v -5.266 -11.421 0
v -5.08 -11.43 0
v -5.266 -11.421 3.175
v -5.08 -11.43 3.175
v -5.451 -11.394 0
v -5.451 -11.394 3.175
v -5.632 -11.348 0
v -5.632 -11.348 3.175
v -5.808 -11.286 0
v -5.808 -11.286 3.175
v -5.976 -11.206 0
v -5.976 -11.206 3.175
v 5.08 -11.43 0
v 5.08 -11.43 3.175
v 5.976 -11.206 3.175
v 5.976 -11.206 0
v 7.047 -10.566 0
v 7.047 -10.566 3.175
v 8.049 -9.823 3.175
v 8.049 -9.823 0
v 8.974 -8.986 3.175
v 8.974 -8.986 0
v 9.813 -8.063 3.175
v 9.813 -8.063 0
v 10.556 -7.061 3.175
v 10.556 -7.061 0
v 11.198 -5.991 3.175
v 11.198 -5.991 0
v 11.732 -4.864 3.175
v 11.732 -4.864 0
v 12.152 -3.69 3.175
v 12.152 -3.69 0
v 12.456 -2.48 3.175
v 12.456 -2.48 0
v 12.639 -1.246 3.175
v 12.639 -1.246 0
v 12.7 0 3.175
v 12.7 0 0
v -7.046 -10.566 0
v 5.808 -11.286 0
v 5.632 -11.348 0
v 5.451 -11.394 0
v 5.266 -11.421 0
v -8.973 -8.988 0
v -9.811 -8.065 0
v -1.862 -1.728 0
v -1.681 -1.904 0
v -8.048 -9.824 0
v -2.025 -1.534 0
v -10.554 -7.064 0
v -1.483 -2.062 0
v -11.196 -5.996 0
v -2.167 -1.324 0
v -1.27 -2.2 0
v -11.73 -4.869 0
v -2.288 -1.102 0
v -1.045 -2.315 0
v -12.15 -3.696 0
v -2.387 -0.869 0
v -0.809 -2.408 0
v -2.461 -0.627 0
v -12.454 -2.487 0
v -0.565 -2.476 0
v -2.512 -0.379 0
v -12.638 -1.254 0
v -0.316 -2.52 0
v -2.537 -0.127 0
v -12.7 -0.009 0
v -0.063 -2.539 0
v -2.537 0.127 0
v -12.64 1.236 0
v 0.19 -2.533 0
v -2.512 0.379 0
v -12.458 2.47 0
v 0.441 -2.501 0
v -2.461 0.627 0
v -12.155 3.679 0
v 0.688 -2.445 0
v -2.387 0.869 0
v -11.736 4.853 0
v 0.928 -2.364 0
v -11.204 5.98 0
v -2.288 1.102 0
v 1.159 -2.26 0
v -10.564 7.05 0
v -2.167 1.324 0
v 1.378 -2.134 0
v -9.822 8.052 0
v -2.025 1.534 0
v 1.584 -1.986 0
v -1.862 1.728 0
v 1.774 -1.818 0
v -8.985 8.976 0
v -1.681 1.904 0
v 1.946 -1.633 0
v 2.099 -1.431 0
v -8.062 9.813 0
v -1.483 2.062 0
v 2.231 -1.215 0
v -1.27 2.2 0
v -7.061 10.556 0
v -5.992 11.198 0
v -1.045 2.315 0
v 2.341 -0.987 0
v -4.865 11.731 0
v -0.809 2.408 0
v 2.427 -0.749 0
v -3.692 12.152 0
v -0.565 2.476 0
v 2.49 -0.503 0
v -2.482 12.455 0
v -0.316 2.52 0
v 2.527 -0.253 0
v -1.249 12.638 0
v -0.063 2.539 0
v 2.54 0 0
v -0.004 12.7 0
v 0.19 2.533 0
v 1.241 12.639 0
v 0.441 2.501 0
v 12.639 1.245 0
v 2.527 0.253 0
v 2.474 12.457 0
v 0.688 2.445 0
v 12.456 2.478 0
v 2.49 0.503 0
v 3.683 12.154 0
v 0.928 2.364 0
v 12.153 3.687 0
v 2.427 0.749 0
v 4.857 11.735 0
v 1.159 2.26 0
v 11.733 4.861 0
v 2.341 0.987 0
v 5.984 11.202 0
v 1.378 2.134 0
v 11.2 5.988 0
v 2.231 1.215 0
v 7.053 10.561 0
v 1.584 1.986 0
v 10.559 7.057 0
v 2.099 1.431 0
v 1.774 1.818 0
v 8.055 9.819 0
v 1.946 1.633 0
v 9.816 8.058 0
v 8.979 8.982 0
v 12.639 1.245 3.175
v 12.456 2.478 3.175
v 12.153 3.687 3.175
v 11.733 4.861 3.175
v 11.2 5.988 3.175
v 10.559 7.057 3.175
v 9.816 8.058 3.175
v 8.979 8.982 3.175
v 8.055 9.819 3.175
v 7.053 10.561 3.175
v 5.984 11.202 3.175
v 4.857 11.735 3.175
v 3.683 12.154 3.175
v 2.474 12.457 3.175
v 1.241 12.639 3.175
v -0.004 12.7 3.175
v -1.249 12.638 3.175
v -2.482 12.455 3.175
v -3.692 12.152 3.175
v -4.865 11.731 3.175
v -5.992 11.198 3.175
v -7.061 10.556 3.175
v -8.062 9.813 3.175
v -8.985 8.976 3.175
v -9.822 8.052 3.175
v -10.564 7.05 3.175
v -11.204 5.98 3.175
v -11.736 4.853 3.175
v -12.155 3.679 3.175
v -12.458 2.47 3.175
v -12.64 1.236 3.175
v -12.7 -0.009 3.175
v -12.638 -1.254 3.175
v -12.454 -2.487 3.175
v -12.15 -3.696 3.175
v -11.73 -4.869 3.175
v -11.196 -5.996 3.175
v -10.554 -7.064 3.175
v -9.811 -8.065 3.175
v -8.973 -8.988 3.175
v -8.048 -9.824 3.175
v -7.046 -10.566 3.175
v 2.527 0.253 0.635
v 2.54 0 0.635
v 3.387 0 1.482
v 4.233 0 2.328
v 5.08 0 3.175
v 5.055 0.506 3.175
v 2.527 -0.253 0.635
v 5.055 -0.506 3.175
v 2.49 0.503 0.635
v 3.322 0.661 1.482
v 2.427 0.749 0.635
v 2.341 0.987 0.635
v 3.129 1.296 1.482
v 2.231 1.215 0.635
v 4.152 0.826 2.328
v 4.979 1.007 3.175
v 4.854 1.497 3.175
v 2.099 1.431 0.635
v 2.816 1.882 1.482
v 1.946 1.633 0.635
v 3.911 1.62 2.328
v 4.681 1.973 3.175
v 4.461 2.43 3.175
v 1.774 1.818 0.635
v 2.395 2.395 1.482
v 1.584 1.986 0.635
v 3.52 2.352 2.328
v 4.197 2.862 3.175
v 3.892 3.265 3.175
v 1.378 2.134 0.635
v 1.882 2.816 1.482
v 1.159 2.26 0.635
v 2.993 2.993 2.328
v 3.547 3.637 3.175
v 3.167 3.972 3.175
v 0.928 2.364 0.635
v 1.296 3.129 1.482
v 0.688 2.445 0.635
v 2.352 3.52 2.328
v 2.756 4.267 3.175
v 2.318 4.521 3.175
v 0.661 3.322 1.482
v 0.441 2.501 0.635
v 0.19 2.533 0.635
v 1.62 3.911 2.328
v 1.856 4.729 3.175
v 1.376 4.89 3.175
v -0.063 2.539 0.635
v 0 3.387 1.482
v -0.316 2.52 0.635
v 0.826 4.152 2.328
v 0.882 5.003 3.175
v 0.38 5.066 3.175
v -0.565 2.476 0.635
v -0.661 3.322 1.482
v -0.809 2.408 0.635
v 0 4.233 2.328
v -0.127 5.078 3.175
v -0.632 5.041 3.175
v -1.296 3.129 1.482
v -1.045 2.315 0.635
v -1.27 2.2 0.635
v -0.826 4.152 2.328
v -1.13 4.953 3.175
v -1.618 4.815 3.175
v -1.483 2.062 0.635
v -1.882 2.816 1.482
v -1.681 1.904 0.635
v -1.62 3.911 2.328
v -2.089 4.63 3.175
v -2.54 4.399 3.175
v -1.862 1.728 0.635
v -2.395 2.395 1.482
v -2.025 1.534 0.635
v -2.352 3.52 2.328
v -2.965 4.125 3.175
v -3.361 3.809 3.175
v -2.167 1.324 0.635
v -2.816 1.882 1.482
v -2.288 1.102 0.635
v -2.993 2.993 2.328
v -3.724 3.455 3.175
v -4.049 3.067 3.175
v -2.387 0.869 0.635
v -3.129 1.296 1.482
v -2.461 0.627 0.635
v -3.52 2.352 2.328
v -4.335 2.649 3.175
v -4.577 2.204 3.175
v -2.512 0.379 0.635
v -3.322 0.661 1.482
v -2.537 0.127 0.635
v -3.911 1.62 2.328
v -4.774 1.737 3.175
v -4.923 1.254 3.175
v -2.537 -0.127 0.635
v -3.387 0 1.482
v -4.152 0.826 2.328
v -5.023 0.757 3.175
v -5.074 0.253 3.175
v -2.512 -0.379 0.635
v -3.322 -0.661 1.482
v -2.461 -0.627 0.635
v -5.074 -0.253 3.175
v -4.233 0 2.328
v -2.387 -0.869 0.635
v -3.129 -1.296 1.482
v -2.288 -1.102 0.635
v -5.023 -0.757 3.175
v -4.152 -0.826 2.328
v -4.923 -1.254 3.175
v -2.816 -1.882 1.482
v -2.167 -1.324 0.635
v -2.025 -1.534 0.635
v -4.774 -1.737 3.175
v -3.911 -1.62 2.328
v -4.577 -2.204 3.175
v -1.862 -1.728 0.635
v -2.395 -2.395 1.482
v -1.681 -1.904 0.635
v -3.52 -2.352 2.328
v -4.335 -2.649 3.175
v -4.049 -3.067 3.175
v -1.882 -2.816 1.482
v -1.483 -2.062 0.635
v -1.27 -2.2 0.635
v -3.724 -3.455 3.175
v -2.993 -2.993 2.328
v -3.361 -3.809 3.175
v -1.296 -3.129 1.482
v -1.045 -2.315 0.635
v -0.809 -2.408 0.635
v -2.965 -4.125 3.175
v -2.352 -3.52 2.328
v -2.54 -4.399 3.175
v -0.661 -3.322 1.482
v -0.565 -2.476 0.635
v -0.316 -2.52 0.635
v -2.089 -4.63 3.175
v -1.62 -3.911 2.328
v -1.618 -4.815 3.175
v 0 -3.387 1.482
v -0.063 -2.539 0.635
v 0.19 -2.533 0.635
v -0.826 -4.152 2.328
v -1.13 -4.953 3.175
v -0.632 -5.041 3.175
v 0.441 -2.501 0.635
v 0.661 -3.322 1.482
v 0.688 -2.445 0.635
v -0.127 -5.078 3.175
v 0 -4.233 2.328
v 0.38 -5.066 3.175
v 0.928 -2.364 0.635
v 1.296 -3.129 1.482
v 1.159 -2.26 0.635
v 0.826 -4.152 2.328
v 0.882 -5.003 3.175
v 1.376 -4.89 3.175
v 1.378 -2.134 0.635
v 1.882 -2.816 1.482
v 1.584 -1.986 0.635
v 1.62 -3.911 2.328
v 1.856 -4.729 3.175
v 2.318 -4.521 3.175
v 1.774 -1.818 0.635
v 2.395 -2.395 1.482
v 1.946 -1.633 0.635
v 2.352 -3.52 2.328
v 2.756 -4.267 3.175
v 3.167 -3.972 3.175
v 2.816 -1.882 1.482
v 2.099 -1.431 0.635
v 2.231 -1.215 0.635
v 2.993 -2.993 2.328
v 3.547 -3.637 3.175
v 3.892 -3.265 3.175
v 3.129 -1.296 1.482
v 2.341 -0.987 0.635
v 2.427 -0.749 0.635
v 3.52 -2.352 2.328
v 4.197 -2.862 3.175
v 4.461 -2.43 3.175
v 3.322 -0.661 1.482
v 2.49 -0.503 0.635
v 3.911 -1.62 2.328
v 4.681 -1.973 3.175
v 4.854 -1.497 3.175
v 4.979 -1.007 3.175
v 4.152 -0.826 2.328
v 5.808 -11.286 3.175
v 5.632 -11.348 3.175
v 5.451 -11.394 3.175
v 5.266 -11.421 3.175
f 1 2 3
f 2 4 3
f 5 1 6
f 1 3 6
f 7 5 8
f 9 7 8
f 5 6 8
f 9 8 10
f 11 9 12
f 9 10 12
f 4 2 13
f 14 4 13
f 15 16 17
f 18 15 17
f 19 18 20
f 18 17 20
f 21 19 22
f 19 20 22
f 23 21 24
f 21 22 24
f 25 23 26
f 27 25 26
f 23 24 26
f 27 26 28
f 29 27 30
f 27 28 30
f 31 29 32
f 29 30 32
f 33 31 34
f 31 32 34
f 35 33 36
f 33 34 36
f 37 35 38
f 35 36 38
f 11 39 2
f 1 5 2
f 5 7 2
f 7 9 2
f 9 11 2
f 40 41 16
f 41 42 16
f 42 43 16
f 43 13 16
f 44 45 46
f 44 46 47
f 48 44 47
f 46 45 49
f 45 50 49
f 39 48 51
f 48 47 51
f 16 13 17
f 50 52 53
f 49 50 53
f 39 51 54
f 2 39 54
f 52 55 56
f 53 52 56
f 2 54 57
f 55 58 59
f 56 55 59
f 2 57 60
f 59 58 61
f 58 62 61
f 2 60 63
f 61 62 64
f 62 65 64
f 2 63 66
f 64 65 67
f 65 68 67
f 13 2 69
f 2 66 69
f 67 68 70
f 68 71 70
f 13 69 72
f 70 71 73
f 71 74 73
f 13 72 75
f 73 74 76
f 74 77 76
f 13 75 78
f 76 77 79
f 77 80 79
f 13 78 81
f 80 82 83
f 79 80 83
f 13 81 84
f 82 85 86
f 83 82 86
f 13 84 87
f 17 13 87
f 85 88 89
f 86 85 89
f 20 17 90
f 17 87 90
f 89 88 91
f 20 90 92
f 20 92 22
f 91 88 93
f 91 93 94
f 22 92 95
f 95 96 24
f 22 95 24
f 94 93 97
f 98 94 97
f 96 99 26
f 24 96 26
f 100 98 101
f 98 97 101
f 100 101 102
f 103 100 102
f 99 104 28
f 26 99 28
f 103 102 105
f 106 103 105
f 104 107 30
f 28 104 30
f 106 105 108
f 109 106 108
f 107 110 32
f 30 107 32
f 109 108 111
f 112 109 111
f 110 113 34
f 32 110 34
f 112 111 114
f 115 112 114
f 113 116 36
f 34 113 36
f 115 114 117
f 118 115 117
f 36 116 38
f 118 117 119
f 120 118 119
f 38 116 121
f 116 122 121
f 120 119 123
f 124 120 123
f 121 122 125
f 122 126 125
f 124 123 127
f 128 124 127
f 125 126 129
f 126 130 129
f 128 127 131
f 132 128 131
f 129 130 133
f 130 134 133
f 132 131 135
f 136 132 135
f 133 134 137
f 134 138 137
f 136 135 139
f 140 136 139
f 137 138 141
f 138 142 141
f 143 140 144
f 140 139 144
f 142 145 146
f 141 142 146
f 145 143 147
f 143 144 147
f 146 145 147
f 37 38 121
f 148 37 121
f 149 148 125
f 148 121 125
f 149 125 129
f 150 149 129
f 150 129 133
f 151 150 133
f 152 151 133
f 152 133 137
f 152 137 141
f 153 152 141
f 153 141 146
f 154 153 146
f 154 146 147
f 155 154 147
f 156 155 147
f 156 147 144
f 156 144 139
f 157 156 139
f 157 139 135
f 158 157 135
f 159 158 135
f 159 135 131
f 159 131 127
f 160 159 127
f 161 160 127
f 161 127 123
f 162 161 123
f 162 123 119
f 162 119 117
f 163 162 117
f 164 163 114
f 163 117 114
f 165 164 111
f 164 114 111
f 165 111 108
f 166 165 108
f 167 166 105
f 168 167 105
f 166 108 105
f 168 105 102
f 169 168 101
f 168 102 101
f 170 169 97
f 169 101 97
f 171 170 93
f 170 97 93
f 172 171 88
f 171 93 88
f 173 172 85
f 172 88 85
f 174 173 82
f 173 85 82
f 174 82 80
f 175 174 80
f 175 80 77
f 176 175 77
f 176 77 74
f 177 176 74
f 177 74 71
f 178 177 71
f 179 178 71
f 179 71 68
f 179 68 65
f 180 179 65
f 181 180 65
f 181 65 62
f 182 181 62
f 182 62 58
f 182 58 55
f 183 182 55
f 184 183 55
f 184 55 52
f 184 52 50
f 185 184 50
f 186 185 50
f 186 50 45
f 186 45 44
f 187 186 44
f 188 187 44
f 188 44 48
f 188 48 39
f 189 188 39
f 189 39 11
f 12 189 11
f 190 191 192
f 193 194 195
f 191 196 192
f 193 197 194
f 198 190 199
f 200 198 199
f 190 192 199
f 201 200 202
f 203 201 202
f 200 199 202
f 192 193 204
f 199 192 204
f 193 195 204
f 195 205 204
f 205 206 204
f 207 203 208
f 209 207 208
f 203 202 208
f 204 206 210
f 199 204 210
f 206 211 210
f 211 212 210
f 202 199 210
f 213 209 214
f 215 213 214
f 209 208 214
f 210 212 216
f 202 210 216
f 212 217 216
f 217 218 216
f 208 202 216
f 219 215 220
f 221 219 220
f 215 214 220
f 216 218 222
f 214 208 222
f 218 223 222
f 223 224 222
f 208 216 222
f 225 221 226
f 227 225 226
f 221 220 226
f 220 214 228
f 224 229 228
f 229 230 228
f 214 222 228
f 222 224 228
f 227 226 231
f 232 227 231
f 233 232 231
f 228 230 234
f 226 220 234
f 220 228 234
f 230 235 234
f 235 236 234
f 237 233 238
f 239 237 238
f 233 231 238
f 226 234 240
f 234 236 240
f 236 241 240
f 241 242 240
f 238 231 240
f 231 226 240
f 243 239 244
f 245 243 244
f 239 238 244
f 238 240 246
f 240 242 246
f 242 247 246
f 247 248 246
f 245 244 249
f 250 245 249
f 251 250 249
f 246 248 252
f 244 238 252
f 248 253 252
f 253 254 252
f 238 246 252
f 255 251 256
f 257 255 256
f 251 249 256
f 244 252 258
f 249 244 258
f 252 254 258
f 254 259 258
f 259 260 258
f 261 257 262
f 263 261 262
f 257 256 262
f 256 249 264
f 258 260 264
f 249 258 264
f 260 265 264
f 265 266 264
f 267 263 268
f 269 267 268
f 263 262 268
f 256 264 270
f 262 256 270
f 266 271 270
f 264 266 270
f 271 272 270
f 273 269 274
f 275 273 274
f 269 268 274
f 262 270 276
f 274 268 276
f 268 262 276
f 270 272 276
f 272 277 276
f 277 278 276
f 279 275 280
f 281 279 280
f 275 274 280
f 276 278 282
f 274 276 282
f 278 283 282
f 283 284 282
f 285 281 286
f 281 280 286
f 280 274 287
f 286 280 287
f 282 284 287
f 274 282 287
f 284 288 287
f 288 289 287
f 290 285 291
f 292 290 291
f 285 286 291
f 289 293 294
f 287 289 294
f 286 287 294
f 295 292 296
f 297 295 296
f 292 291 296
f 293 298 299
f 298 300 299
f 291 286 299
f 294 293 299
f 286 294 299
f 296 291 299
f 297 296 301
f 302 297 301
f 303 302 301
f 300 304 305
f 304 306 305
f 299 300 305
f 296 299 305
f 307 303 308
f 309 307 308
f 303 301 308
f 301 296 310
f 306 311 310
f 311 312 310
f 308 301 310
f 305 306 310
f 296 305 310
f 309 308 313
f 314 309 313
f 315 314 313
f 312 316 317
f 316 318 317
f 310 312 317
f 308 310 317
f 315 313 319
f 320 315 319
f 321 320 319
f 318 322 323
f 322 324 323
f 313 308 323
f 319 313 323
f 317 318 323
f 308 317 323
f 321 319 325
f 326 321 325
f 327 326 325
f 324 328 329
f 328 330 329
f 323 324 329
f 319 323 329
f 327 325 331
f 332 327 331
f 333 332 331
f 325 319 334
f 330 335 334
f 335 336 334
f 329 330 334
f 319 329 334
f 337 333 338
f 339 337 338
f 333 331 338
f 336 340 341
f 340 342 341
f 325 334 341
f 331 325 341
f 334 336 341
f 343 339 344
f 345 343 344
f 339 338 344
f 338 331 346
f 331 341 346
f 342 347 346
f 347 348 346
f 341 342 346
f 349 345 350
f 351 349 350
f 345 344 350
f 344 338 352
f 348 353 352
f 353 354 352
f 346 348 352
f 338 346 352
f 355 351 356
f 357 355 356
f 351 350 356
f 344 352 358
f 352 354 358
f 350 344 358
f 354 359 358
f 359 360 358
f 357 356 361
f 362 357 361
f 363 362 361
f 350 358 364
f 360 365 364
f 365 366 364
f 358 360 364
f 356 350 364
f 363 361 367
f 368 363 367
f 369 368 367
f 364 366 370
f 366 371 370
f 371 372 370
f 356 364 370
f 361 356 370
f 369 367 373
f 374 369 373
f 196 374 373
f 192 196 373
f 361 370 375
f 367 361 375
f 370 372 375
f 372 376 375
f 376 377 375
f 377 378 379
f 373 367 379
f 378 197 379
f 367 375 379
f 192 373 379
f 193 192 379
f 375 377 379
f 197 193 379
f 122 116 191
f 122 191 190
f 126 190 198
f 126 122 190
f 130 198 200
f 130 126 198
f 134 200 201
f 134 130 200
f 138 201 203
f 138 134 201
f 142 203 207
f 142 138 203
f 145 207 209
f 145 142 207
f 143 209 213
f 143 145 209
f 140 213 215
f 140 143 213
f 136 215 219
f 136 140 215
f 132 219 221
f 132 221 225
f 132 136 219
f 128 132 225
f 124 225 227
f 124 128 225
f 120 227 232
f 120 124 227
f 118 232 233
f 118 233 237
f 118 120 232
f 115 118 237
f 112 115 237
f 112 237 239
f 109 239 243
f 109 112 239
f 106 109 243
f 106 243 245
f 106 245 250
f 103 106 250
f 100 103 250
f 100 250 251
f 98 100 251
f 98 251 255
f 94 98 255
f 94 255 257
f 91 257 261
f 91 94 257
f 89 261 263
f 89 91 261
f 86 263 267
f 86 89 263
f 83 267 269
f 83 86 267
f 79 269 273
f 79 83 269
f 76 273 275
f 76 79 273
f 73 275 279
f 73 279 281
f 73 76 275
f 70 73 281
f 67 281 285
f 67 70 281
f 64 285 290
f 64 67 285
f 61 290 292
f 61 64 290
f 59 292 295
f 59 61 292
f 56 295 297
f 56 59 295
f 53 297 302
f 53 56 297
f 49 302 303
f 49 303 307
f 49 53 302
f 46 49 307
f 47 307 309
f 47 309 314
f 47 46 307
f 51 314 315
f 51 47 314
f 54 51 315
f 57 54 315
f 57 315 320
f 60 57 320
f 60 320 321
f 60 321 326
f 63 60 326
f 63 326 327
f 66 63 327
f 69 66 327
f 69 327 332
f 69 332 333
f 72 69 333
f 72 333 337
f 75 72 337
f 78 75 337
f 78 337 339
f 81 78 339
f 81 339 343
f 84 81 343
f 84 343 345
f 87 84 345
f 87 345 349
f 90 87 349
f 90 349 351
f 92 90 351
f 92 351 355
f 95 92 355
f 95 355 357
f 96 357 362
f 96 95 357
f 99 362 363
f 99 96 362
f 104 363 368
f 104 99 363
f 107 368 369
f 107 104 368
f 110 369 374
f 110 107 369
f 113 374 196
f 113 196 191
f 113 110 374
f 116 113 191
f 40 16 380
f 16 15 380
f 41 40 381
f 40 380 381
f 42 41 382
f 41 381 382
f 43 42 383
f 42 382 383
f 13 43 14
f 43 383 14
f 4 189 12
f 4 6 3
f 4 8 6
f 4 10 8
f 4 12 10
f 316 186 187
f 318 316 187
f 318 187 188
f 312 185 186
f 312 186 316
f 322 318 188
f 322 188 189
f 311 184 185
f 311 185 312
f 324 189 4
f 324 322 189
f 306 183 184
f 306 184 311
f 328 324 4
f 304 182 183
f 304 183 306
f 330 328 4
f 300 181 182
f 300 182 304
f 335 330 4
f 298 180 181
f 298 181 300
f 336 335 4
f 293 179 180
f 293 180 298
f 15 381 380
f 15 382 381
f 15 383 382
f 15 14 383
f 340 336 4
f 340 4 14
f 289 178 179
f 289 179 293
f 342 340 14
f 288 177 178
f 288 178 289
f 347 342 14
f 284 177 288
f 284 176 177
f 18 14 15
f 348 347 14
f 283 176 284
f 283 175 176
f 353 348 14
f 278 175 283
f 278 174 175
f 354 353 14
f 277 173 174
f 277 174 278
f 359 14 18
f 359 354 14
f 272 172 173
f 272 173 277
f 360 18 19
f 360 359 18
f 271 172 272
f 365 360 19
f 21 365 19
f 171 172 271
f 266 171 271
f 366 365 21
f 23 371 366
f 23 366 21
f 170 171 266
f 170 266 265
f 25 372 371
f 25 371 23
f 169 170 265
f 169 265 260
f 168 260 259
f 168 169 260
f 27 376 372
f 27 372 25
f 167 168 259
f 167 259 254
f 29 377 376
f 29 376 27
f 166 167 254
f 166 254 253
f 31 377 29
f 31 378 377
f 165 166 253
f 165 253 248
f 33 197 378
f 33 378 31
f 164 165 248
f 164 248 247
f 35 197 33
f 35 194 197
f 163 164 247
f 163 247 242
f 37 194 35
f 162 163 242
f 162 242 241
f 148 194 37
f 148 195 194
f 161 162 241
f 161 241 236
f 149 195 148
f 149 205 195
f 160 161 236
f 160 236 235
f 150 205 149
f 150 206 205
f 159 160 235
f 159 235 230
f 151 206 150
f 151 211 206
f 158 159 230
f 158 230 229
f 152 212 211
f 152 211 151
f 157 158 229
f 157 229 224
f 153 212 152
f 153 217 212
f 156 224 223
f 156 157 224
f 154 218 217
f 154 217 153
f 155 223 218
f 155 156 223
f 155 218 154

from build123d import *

# Parameters (mm, degrees)
F0_R     = 2.54
F1_DEPTH = 3.175
F2_SIZE2 = 2.54
F2_SIZE  = 2.54
F3_R     = 1.905


with BuildPart() as f1:
    # F0 (on Top) → F1 (new body)
    with BuildSketch(Plane.XY):
        with BuildLine():
            ThreePointArc((5.5358016583, -11.43), (10.7609172718, -6.7448246434), (12.7, 0))
            ThreePointArc((12.7, 0), (-6.7448246434, 10.7609172718), (-5.5358016583, -11.43))
            Line((-5.5358016583, -11.43), (5.5358016583, -11.43))
        make_face()
        Circle(F0_R, mode=Mode.SUBTRACT)
    extrude(amount=F1_DEPTH)

    # F2
    f2_edges = [f1.edges().sort_by_distance(p)[0] for p in [
        (-2.54, 0, 3.175),
    ]]
    chamfer(f2_edges, length=F2_SIZE, length2=F2_SIZE2)

    # F3
    f3_edges = [f1.edges().sort_by_distance(p)[0] for p in [
        (-5.535802, -11.43, 1.5875),
        (5.535802, -11.43, 1.5875),
    ]]
    fillet(f3_edges, radius=F3_R)


solid = f1.part
